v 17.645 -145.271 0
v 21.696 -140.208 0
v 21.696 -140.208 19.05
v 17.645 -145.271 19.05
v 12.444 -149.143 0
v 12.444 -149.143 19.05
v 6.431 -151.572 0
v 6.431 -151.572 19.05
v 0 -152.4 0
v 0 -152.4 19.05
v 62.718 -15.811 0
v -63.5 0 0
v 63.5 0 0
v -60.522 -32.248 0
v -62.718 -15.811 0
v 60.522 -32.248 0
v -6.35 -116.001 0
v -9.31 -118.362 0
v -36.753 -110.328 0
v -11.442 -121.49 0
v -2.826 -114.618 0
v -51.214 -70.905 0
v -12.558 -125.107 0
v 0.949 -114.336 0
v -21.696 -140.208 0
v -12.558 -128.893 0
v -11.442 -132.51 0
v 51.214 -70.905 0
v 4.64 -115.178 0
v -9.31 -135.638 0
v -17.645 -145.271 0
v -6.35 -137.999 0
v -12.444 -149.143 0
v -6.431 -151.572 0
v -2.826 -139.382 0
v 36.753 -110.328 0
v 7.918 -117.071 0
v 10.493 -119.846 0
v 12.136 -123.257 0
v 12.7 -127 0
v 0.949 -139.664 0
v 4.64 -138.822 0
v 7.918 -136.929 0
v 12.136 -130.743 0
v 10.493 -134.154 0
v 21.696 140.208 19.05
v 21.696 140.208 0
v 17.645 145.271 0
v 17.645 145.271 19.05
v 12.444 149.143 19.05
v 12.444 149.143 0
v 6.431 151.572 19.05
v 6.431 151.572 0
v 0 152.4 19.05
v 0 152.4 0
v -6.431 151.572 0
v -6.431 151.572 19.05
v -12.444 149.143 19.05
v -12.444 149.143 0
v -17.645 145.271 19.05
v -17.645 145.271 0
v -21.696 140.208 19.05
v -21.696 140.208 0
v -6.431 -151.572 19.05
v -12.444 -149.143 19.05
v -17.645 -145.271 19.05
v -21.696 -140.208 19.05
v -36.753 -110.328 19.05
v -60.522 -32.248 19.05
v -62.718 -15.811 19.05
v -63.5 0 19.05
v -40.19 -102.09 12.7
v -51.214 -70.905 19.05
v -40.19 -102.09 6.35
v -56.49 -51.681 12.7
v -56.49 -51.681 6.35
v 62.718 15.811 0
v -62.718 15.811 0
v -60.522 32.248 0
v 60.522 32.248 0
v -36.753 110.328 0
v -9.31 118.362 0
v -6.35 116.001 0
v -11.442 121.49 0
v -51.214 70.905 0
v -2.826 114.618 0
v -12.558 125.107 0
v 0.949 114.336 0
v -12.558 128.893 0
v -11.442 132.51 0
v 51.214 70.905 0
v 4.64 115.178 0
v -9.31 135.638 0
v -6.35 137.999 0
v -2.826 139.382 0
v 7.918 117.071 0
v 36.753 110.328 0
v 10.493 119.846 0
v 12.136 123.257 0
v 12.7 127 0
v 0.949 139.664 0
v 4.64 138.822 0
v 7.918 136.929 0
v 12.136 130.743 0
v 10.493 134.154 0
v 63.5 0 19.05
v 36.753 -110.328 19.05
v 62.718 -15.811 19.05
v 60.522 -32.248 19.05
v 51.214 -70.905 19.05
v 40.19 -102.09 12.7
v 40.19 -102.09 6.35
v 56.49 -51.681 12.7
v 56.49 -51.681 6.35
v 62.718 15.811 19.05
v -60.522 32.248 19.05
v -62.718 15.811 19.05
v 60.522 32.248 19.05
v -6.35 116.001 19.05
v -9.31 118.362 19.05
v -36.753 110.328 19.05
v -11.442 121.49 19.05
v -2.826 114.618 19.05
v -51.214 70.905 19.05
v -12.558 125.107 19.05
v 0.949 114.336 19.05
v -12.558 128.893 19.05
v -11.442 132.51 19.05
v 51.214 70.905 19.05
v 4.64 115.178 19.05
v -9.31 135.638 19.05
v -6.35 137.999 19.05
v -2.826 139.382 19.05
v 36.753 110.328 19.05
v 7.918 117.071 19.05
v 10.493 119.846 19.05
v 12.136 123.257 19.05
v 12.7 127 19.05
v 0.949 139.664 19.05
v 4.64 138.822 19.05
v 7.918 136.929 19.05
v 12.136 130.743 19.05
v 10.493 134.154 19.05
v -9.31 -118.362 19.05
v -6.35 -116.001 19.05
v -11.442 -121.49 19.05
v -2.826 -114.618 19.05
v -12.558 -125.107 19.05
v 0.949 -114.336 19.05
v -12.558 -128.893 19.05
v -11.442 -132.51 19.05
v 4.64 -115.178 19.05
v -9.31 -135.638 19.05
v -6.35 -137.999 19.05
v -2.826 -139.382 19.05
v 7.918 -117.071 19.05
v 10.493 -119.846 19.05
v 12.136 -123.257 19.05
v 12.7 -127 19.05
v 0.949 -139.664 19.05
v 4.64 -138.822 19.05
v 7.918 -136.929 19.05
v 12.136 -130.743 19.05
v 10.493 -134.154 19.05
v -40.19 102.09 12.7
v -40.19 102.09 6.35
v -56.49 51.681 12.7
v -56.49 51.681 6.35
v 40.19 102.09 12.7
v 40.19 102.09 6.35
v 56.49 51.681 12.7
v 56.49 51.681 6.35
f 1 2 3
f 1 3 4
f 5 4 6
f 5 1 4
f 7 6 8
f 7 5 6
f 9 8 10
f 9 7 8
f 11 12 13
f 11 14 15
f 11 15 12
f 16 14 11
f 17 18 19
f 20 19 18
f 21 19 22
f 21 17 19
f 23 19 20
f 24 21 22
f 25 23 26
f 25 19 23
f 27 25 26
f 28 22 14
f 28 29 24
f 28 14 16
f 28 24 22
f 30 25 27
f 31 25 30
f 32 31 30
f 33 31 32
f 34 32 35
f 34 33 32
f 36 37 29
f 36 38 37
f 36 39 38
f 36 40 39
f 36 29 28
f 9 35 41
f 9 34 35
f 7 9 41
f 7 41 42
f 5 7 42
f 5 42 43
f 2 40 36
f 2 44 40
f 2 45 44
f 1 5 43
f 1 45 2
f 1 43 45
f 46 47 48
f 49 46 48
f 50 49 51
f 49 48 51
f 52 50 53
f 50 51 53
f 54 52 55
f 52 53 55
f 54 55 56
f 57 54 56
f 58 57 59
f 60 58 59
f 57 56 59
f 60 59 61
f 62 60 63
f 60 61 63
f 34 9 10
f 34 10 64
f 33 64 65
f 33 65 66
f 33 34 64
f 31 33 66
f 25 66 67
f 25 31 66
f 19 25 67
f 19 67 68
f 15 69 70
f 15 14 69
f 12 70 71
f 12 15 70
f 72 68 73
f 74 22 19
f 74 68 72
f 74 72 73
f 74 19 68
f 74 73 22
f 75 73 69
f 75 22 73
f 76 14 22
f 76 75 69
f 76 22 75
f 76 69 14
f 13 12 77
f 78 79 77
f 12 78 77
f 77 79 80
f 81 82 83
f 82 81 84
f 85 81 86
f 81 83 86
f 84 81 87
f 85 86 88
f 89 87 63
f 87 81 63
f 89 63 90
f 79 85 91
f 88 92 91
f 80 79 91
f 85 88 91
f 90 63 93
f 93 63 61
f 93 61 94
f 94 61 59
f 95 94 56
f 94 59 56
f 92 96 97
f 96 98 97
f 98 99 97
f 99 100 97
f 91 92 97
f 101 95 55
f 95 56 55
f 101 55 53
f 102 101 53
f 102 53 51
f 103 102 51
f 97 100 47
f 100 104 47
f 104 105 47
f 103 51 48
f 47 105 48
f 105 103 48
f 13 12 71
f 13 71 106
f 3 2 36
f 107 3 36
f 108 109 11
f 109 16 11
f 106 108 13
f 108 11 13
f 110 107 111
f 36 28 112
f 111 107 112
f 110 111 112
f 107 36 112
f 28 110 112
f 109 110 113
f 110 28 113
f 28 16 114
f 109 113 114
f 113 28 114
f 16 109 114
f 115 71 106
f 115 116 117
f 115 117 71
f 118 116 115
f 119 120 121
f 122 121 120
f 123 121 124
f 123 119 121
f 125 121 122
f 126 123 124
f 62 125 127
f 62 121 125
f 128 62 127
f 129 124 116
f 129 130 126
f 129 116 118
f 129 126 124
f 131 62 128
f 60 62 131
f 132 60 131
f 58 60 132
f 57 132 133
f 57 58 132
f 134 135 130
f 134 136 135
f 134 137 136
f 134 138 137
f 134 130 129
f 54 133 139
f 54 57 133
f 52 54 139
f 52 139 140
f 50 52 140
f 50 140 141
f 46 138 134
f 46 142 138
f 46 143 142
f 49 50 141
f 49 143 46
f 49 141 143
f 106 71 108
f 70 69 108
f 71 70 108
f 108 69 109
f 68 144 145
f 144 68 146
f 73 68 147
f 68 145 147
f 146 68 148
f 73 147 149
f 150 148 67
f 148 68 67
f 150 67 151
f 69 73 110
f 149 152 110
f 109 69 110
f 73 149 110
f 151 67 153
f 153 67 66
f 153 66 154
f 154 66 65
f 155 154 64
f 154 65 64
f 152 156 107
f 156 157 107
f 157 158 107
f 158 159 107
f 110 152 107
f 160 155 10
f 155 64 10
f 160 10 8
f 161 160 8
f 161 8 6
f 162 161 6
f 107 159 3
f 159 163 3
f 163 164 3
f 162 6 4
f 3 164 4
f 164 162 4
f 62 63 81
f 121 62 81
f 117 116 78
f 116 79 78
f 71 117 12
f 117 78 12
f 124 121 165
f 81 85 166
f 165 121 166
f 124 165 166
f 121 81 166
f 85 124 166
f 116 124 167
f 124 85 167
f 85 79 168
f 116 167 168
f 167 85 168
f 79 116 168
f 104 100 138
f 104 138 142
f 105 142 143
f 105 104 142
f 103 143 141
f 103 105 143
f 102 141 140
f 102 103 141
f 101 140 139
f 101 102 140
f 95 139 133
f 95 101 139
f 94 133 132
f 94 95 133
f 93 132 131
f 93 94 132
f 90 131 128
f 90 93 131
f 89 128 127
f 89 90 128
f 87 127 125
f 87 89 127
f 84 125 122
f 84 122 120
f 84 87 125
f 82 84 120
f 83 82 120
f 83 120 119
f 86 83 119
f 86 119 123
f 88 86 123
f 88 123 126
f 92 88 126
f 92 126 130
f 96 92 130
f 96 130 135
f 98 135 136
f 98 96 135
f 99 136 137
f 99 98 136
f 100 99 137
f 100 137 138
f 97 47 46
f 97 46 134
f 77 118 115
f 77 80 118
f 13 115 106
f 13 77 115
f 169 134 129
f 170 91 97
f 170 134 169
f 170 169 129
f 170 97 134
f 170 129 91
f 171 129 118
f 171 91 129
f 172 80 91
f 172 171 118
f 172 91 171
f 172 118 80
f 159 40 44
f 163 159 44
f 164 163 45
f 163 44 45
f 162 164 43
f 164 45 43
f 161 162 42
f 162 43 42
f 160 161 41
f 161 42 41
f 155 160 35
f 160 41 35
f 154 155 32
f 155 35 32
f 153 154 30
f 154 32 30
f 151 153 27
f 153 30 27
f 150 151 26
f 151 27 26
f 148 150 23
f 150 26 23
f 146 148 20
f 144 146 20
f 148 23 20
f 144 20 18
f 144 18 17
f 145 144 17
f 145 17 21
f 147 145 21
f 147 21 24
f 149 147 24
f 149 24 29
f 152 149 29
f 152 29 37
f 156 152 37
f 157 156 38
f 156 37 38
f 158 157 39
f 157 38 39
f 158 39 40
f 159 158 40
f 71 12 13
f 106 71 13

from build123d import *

# Parameters (mm, degrees)
F0_R     = 12.7
F1_DEPTH = 19.05


# Not quite as in the source:
# - a feature names something its author has since deleted; it is built from what else it names


with BuildPart() as f1:
    # F0 (on Top) → F1 (new body)
    with BuildSketch(Plane.XY):
        with BuildLine():
            Line((-63.5, 0), (0, 0))
            Line((0, 0), (63.5, 0))
            add(Edge.make_bspline(
                [(21.6959799399, 140.2077422162), (38.9229681719, 111.9094619356), (63.5, 48.6426617372), (63.5, 0)],
                knots=[0, 0, 0, 0, 146.3071668462, 146.3071668462, 146.3071668462, 146.3071668462], degree=3))
            ThreePointArc((21.6959799399, 140.2077422162), (12.4435394424, 149.1431327085), (0, 152.4))
            ThreePointArc((0, 152.4), (-12.4435394424, 149.1431327085), (-21.6959799399, 140.2077422162))
            add(Edge.make_bspline(
                [(-21.6959799399, 140.2077422162), (-38.9229681719, 111.9094619356), (-63.5, 48.6426617372), (-63.5, 0)],
                knots=[0, 0, 0, 0, 146.3071668462, 146.3071668462, 146.3071668462, 146.3071668462], degree=3))
        make_face()
        with Locations((0, 127)):
            Circle(F0_R, mode=Mode.SUBTRACT)
    extrude(amount=F1_DEPTH)


with BuildPart() as f2_1:
    # F2: instance of F1
    add(f1.part.mirror(Plane.XZ))


solid = Compound([f1.part, f2_1.part])
